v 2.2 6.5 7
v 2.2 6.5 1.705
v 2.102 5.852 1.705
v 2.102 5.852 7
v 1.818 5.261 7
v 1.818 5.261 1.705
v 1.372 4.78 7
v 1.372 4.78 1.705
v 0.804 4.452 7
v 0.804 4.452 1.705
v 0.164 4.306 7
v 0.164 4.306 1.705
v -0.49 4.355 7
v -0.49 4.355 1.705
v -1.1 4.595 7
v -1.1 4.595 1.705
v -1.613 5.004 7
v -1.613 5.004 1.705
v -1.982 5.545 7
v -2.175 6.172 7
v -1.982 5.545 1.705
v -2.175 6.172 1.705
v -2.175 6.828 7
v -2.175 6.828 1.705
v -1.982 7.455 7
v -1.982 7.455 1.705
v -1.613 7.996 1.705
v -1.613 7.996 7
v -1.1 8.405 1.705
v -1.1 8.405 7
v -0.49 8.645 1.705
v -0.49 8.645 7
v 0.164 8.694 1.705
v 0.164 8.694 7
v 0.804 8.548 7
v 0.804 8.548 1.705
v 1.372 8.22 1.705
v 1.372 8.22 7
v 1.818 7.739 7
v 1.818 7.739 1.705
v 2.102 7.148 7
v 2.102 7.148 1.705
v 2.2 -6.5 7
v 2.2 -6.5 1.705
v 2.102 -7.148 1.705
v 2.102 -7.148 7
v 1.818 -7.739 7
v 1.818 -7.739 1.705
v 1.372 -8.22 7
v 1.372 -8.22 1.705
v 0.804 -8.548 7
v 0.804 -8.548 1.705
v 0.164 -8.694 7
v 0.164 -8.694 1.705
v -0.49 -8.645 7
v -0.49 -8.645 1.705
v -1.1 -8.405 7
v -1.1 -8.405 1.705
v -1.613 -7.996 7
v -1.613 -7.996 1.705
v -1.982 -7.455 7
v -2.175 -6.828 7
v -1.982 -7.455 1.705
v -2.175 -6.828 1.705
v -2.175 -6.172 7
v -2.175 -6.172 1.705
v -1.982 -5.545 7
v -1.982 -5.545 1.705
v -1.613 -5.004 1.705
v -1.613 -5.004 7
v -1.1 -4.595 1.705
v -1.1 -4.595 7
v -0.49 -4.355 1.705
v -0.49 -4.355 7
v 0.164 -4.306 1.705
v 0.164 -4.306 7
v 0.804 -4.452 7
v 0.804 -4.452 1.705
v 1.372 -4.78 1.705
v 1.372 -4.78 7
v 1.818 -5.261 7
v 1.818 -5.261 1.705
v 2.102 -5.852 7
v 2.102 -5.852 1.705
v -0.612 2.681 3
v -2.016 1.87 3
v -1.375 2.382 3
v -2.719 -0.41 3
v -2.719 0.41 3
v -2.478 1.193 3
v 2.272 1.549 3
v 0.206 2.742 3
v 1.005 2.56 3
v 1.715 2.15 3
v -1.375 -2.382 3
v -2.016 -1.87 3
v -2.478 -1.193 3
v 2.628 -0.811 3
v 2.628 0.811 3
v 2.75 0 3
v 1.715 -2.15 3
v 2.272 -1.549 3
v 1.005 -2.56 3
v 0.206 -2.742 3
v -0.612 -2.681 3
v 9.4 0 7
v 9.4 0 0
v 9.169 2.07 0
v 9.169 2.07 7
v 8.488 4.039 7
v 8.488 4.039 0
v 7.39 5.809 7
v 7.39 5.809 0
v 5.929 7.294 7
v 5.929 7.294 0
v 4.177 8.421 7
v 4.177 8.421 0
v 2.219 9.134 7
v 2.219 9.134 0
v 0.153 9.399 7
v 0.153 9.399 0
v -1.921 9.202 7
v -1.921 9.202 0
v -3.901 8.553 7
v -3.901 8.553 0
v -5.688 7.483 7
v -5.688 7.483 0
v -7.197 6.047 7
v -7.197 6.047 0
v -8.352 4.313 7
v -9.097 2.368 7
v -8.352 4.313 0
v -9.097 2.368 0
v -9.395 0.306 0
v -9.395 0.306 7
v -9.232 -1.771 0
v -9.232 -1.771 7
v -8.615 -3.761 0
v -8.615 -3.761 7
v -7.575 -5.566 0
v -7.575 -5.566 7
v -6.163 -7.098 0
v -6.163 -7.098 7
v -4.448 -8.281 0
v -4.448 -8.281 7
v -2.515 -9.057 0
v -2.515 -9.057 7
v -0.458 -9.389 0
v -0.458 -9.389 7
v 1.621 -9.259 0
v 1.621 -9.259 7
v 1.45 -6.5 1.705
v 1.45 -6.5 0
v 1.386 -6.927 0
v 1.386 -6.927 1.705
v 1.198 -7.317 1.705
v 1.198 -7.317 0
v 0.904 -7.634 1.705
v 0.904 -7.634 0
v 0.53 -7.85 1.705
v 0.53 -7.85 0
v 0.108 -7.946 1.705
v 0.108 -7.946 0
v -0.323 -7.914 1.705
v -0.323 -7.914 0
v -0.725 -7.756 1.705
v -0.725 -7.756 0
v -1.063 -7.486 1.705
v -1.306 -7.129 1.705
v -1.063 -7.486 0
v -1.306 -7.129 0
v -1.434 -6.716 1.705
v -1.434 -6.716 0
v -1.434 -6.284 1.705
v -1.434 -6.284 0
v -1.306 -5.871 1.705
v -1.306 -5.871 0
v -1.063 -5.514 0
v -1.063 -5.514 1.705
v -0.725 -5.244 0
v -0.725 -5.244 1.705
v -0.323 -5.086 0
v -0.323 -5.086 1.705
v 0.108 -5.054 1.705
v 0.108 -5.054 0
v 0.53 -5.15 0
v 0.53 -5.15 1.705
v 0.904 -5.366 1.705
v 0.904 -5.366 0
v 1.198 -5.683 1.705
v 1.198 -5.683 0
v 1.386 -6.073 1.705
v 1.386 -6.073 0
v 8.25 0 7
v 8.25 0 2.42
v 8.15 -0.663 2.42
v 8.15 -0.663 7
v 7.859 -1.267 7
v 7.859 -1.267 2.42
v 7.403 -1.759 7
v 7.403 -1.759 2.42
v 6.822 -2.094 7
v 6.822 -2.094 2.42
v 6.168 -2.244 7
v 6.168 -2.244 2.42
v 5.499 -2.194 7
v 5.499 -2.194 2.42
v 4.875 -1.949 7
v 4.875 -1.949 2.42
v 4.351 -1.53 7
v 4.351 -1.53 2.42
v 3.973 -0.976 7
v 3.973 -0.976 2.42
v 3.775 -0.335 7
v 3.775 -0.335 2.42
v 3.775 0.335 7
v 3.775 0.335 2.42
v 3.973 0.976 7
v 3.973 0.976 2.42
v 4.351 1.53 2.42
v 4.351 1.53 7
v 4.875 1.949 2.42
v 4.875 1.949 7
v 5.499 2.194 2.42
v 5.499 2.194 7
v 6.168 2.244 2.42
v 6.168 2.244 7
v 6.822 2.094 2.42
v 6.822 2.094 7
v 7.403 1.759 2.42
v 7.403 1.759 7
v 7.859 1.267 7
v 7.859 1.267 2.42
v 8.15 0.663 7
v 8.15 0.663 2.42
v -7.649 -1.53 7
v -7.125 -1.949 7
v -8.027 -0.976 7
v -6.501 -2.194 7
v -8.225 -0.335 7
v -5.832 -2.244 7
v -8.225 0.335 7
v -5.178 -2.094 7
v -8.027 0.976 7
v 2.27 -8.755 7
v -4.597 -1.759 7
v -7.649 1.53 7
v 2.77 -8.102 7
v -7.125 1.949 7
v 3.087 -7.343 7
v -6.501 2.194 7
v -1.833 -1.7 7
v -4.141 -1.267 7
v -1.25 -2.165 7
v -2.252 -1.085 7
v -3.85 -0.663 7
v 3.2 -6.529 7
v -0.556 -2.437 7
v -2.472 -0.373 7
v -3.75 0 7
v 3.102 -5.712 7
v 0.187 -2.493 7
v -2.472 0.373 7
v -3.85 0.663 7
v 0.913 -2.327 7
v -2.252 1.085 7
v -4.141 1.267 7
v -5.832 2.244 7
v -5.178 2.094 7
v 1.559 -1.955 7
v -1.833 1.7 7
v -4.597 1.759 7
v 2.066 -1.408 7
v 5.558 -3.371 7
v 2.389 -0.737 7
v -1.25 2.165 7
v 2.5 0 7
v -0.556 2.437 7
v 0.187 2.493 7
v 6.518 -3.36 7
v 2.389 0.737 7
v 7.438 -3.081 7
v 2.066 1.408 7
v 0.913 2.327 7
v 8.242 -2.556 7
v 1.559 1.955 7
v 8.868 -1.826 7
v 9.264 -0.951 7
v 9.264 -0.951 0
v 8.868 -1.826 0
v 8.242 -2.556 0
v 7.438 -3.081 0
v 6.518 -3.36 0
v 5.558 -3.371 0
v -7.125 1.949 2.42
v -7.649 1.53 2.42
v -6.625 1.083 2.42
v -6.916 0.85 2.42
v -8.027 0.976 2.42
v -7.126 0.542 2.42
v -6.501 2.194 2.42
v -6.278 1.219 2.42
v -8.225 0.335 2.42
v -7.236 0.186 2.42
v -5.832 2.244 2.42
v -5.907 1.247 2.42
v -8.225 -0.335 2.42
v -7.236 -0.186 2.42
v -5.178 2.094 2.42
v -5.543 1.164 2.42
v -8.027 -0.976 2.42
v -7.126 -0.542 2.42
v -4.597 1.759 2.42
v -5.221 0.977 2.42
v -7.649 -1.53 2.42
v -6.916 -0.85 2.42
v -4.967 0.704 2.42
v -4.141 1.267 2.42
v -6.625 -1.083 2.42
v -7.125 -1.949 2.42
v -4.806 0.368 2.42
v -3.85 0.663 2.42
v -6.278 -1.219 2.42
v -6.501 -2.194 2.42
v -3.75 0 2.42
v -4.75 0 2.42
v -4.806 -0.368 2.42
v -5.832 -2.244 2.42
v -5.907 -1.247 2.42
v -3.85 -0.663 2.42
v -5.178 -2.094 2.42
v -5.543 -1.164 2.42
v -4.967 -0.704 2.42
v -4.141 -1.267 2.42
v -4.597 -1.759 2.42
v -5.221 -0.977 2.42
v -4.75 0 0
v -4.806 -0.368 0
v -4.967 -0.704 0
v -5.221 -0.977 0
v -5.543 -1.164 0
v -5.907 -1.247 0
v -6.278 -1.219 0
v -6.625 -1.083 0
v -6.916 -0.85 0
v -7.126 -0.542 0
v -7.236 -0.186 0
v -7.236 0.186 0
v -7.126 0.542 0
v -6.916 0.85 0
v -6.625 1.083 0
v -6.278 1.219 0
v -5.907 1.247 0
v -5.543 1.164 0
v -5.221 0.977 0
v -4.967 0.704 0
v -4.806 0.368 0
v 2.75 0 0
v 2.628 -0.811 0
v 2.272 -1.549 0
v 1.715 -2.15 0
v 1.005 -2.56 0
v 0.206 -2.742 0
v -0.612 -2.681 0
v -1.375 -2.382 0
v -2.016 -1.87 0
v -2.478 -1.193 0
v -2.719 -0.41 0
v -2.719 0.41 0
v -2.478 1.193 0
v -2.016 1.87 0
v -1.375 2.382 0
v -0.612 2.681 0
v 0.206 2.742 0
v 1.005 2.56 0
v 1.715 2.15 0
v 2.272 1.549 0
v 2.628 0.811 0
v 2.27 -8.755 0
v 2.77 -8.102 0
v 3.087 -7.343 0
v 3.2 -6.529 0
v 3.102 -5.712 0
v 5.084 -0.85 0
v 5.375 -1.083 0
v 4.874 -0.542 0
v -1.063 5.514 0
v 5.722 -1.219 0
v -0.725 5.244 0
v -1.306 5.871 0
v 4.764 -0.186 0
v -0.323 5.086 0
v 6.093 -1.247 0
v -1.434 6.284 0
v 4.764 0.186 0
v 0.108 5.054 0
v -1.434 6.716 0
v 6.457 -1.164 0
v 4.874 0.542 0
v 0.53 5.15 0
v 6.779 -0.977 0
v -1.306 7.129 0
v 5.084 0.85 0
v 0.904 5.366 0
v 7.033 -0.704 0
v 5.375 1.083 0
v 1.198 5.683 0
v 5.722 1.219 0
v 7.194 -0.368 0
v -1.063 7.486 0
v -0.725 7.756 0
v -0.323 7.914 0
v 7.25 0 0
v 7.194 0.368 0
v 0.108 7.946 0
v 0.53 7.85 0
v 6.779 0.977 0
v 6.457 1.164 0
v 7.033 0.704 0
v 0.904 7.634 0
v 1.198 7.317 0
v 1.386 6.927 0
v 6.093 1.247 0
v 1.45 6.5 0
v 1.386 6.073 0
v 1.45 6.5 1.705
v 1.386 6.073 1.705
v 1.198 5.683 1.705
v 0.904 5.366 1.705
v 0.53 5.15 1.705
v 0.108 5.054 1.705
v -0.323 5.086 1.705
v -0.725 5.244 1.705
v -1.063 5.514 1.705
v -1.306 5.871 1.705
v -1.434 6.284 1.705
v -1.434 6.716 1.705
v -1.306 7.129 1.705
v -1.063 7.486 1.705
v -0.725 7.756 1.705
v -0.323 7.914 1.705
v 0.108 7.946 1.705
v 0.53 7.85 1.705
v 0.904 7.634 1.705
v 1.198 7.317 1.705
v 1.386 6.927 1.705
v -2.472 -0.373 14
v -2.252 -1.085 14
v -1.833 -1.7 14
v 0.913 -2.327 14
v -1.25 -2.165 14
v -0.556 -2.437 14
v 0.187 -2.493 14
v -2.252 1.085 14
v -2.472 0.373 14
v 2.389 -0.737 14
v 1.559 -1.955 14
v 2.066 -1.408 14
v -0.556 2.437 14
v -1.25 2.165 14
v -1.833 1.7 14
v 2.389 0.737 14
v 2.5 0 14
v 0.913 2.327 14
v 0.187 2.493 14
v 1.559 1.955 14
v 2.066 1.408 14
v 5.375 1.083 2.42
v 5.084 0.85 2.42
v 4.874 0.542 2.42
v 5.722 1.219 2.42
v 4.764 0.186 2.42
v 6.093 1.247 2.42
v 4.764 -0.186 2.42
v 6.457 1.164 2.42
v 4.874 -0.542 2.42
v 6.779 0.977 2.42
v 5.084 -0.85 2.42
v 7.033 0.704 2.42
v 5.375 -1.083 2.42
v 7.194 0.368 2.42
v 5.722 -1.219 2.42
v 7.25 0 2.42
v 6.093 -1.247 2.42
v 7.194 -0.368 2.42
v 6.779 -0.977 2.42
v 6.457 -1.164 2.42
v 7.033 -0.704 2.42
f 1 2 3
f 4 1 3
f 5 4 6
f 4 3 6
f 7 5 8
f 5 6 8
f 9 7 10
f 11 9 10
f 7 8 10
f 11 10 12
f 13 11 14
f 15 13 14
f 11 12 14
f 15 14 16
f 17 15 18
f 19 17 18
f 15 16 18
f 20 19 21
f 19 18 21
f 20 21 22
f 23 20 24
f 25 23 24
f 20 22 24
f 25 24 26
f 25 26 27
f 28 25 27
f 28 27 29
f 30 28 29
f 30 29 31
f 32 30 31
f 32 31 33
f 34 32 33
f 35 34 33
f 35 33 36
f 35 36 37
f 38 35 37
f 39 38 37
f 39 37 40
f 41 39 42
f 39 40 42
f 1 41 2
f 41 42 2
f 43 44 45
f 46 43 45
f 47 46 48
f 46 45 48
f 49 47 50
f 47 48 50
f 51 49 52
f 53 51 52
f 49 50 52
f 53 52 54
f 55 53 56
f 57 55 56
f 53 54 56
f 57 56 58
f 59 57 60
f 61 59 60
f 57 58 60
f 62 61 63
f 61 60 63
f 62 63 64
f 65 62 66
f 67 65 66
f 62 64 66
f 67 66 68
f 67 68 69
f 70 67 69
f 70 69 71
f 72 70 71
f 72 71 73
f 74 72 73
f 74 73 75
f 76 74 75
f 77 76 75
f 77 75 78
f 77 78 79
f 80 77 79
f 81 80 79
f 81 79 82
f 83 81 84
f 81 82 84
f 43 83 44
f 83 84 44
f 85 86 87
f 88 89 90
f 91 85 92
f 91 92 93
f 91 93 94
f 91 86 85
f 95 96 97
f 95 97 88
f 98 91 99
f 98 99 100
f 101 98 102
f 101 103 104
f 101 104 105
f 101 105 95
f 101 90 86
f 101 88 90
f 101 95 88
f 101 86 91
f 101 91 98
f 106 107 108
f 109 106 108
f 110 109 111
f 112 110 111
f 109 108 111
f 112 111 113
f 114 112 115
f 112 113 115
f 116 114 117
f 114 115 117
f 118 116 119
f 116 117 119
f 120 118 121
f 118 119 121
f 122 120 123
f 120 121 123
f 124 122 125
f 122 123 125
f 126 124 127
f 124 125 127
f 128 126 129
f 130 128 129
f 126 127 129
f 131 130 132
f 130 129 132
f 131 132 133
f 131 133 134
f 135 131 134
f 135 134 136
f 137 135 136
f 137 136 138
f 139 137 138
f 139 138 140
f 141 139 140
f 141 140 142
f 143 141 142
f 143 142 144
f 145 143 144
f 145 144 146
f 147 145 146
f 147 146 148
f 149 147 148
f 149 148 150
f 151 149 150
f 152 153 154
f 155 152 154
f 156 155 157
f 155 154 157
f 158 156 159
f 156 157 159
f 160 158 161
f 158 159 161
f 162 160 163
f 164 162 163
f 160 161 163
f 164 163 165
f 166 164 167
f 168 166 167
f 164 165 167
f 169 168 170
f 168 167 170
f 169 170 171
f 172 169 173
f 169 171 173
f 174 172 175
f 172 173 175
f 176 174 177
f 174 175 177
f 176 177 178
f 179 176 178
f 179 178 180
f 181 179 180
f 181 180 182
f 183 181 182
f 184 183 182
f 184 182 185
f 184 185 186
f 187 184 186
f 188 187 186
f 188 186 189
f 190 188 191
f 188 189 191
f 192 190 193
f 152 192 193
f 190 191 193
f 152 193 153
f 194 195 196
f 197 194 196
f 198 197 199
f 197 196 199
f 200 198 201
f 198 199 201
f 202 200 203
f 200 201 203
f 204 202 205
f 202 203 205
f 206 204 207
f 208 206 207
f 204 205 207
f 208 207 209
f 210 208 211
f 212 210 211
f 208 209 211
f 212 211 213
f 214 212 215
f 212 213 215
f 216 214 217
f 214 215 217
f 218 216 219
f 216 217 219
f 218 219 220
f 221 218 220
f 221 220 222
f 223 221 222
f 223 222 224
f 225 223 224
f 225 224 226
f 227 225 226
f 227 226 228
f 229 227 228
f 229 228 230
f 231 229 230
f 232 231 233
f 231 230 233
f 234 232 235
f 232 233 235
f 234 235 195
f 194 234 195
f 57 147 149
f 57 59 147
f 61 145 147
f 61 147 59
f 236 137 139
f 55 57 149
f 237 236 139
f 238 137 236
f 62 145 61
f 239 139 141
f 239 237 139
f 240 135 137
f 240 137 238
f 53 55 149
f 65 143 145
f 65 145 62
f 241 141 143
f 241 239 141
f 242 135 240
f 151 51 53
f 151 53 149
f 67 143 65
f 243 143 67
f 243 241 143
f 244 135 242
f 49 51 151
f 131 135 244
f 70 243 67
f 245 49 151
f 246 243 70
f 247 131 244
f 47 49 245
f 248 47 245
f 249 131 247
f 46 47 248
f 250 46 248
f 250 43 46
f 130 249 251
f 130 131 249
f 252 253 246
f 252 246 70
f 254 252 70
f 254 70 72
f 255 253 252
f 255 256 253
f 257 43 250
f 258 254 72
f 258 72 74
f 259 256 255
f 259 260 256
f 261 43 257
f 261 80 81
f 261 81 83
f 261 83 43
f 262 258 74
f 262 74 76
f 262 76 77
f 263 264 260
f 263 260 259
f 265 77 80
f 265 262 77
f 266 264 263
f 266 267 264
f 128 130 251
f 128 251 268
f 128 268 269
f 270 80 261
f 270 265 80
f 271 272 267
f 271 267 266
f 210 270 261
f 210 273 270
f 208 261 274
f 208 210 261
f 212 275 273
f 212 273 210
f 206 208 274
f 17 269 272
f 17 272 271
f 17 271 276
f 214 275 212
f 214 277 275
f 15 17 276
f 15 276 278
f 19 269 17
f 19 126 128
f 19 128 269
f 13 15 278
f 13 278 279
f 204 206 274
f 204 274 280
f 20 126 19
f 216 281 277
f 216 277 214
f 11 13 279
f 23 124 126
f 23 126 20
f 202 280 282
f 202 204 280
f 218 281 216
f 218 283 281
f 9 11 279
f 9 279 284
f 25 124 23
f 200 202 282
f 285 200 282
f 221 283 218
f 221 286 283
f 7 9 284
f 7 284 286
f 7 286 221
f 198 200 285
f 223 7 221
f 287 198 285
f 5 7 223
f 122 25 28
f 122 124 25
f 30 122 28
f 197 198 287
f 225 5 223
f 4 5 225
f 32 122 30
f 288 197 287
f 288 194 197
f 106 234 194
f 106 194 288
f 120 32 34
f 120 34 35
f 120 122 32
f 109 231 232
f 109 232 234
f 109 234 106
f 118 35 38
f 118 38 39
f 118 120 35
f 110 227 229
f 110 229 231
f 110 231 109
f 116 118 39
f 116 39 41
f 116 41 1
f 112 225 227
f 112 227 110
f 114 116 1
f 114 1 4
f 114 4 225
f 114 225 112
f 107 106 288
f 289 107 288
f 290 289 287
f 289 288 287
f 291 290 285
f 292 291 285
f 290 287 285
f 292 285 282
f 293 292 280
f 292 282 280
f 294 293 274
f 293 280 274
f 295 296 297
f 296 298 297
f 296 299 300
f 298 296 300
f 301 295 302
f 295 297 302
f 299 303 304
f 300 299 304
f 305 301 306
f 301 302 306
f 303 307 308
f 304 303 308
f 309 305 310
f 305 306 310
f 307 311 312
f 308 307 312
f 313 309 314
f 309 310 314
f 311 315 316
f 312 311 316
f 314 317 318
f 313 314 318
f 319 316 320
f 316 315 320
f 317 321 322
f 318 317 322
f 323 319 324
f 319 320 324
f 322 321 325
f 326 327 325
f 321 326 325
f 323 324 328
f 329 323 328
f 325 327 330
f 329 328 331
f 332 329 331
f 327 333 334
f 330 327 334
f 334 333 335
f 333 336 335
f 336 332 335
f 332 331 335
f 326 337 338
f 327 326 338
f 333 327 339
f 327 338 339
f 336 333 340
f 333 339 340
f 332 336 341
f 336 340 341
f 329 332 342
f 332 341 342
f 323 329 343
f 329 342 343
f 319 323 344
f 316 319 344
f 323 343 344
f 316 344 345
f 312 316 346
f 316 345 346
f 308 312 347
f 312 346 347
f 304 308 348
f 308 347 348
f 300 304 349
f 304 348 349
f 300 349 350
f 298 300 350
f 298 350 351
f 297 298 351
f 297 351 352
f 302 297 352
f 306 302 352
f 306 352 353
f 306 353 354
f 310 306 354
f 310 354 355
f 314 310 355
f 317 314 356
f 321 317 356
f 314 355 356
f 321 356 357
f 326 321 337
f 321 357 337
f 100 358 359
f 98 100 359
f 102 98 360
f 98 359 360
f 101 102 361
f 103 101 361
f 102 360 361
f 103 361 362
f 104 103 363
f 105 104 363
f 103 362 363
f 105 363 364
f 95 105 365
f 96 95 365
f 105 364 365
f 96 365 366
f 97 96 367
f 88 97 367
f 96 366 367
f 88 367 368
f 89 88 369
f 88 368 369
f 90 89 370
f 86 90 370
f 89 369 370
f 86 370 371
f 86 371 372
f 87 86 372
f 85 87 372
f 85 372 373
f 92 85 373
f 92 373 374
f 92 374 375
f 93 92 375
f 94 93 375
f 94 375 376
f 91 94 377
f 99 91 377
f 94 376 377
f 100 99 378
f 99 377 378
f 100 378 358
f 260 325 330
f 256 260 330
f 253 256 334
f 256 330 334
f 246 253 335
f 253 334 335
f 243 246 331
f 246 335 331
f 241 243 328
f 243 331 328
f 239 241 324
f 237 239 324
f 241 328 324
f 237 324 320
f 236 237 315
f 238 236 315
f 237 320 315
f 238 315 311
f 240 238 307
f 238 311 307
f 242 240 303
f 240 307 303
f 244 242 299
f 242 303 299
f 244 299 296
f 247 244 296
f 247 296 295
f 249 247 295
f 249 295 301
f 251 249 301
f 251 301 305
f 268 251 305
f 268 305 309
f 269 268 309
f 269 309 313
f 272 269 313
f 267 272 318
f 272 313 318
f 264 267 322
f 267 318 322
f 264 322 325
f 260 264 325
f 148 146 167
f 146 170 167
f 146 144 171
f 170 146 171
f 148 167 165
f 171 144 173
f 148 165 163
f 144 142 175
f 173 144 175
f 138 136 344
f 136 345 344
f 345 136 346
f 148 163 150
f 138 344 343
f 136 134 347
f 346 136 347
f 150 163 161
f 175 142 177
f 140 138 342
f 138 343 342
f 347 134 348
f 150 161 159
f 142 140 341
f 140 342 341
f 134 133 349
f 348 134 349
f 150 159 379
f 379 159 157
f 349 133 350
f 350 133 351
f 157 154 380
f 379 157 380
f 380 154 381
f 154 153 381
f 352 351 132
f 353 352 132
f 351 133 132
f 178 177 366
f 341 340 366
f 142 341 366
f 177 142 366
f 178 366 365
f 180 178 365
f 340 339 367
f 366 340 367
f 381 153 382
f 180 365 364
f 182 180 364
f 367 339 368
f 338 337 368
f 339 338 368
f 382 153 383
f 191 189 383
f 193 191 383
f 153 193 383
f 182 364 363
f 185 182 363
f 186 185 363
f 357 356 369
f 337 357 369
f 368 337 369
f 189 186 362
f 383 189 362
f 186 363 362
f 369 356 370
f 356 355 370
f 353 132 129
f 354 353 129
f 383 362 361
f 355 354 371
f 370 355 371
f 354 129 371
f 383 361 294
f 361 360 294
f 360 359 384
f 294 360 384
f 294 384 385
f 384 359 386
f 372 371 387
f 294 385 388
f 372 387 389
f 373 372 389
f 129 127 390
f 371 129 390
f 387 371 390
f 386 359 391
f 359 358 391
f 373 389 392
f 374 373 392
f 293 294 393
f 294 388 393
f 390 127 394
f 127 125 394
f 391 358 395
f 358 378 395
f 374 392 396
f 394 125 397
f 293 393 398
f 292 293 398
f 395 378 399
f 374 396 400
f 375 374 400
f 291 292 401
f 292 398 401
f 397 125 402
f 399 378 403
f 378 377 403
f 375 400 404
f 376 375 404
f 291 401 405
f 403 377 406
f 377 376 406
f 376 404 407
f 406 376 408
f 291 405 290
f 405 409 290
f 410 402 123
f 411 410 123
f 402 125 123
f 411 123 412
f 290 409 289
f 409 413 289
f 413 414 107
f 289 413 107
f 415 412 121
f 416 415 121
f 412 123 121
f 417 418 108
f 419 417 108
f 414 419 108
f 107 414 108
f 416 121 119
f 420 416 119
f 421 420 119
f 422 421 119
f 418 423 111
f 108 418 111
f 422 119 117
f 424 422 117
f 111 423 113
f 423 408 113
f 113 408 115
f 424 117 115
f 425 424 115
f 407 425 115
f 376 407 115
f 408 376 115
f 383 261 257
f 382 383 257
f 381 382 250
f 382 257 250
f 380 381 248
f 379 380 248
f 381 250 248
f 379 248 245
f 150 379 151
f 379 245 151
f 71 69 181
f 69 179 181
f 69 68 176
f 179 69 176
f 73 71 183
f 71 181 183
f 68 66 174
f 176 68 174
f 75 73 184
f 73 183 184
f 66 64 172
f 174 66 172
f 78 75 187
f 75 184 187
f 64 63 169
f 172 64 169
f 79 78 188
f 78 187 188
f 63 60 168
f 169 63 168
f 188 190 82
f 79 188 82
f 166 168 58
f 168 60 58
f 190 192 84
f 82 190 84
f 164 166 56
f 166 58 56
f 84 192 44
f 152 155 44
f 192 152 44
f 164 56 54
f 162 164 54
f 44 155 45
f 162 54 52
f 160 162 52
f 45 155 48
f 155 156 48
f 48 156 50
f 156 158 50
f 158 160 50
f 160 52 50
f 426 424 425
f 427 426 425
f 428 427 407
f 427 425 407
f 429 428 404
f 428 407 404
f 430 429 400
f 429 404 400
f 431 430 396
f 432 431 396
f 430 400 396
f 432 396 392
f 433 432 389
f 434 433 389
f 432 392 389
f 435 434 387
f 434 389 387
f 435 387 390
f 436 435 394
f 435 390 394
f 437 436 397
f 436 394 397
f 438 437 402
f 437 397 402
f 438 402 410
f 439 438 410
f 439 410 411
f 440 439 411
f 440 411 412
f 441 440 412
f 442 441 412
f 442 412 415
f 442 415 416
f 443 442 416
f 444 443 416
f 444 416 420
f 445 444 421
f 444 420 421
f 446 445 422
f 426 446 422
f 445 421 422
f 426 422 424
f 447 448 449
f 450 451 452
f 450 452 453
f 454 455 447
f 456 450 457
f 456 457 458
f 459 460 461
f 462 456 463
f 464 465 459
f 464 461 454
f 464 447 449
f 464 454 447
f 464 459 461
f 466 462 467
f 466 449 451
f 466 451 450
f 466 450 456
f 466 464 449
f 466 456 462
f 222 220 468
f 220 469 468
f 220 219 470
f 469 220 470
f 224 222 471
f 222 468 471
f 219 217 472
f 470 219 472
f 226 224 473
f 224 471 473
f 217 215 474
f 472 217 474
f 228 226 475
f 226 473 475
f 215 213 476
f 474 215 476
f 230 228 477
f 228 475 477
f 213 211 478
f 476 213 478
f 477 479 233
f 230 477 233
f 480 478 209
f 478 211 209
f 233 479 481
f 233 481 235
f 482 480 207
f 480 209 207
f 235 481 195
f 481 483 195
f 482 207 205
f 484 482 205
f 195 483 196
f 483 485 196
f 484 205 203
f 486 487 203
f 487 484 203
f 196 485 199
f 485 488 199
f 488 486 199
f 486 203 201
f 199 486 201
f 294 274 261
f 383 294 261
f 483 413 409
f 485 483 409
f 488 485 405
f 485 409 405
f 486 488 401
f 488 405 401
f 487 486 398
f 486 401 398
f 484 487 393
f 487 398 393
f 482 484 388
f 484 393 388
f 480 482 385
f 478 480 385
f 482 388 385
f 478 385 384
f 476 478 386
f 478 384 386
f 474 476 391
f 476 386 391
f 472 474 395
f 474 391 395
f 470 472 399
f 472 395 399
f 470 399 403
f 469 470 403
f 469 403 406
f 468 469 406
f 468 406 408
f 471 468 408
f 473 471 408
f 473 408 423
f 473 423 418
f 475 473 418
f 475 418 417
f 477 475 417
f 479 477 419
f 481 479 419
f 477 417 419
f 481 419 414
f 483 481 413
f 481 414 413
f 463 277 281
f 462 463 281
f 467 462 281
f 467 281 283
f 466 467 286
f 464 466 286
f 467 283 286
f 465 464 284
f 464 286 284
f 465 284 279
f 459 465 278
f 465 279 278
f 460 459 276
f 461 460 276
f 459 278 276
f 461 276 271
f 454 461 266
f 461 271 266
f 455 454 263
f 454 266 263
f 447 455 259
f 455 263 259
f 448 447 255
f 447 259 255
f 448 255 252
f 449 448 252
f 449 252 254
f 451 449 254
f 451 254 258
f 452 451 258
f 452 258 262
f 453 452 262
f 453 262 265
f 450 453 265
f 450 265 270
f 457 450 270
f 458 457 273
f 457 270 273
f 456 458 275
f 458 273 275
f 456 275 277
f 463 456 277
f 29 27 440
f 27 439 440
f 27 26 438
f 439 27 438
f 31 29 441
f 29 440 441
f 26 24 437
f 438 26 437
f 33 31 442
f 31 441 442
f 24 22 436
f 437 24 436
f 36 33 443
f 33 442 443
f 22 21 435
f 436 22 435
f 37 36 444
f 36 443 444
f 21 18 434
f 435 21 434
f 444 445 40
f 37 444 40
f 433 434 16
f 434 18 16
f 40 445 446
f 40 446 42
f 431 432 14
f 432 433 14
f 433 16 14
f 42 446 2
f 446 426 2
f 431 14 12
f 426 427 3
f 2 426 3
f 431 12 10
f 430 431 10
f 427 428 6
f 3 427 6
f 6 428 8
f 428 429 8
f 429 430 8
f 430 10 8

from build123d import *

# Parameters (mm, degrees)
F0_R      = 9.4
F1_DEPTH  = 7
F2_R      = 2.5
F3_DEPTH  = 7
F4_R      = 1.25
F5_DEPTH  = 2.42
F6_R      = 2.25
F7_DEPTH  = 4.58
F8_R      = 1.45
F9_DEPTH  = 1.705
F10_R     = 2.2
F11_DEPTH = 5.295
F12_R     = 2.75
F13_DEPTH = 3
F15_DEPTH = 7


with BuildPart() as f1:
    # F0 (on Top) → F1 (new body)
    with BuildSketch(Plane.XY):
        Circle(F0_R)
    extrude(amount=F1_DEPTH)

    # F2 (on face) → F3 (join)
    with BuildSketch(Plane.XY.offset(7)):
        Circle(F2_R)
    extrude(amount=F3_DEPTH)

    # F4 (on face) → F5 (cut)
    with BuildSketch(Plane(origin=(0, 0, 0), x_dir=(1, 0, 0), z_dir=(0, 0, -1))):
        with Locations((6, 0)):
            Circle(F4_R)
        with Locations((-6, 0)):
            Circle(F4_R)
    extrude(amount=-F5_DEPTH, mode=Mode.SUBTRACT)

    # F6 (on face) → F7 (cut, through all)
    with BuildSketch(Plane(origin=(0, 0, 2.42), x_dir=(1, 0, 0), z_dir=(0, 0, -1))):
        with Locations((-6, 0)):
            Circle(F6_R)
        with Locations((6, 0)):
            Circle(F6_R)
    extrude(amount=-F7_DEPTH, mode=Mode.SUBTRACT)

    # F8 (on face) → F9 (cut)
    with BuildSketch(Plane(origin=(0, 0, 0), x_dir=(1, 0, 0), z_dir=(0, 0, -1))):
        with Locations((0, -6.5)):
            Circle(F8_R)
        with Locations((0, 6.5)):
            Circle(F8_R)
    extrude(amount=-F9_DEPTH, mode=Mode.SUBTRACT)

    # F10 (on face) → F11 (cut, through all)
    with BuildSketch(Plane(origin=(0, 0, 1.705), x_dir=(1, 0, 0), z_dir=(0, 0, -1))):
        with Locations((0, -6.5)):
            Circle(F10_R)
        with Locations((0, 6.5)):
            Circle(F10_R)
    extrude(amount=-F11_DEPTH, mode=Mode.SUBTRACT)

    # F12 (on face) → F13 (cut)
    with BuildSketch(Plane(origin=(0, 0, 0), x_dir=(1, 0, 0), z_dir=(0, 0, -1))):
        Circle(F12_R)
    extrude(amount=-F13_DEPTH, mode=Mode.SUBTRACT)

    # F14 (on face) → F15 (cut, through all)
    with BuildSketch(Plane.XY.offset(7)):
        with BuildLine():
            ThreePointArc((3.101538, -5.712308), (2.95297, -7.732869), (1.620693, -9.259231))
            ThreePointArc((1.620693, -9.259231), (7.197031, -6.046713), (9.4, 0))
            ThreePointArc((9.4, 0), (8.242264, -2.555827), (5.5575, -3.371082))
            Line((5.5575, -3.371082), (3.101538, -5.712308))
        make_face()
    extrude(amount=-F15_DEPTH, mode=Mode.SUBTRACT)


solid = f1.part
